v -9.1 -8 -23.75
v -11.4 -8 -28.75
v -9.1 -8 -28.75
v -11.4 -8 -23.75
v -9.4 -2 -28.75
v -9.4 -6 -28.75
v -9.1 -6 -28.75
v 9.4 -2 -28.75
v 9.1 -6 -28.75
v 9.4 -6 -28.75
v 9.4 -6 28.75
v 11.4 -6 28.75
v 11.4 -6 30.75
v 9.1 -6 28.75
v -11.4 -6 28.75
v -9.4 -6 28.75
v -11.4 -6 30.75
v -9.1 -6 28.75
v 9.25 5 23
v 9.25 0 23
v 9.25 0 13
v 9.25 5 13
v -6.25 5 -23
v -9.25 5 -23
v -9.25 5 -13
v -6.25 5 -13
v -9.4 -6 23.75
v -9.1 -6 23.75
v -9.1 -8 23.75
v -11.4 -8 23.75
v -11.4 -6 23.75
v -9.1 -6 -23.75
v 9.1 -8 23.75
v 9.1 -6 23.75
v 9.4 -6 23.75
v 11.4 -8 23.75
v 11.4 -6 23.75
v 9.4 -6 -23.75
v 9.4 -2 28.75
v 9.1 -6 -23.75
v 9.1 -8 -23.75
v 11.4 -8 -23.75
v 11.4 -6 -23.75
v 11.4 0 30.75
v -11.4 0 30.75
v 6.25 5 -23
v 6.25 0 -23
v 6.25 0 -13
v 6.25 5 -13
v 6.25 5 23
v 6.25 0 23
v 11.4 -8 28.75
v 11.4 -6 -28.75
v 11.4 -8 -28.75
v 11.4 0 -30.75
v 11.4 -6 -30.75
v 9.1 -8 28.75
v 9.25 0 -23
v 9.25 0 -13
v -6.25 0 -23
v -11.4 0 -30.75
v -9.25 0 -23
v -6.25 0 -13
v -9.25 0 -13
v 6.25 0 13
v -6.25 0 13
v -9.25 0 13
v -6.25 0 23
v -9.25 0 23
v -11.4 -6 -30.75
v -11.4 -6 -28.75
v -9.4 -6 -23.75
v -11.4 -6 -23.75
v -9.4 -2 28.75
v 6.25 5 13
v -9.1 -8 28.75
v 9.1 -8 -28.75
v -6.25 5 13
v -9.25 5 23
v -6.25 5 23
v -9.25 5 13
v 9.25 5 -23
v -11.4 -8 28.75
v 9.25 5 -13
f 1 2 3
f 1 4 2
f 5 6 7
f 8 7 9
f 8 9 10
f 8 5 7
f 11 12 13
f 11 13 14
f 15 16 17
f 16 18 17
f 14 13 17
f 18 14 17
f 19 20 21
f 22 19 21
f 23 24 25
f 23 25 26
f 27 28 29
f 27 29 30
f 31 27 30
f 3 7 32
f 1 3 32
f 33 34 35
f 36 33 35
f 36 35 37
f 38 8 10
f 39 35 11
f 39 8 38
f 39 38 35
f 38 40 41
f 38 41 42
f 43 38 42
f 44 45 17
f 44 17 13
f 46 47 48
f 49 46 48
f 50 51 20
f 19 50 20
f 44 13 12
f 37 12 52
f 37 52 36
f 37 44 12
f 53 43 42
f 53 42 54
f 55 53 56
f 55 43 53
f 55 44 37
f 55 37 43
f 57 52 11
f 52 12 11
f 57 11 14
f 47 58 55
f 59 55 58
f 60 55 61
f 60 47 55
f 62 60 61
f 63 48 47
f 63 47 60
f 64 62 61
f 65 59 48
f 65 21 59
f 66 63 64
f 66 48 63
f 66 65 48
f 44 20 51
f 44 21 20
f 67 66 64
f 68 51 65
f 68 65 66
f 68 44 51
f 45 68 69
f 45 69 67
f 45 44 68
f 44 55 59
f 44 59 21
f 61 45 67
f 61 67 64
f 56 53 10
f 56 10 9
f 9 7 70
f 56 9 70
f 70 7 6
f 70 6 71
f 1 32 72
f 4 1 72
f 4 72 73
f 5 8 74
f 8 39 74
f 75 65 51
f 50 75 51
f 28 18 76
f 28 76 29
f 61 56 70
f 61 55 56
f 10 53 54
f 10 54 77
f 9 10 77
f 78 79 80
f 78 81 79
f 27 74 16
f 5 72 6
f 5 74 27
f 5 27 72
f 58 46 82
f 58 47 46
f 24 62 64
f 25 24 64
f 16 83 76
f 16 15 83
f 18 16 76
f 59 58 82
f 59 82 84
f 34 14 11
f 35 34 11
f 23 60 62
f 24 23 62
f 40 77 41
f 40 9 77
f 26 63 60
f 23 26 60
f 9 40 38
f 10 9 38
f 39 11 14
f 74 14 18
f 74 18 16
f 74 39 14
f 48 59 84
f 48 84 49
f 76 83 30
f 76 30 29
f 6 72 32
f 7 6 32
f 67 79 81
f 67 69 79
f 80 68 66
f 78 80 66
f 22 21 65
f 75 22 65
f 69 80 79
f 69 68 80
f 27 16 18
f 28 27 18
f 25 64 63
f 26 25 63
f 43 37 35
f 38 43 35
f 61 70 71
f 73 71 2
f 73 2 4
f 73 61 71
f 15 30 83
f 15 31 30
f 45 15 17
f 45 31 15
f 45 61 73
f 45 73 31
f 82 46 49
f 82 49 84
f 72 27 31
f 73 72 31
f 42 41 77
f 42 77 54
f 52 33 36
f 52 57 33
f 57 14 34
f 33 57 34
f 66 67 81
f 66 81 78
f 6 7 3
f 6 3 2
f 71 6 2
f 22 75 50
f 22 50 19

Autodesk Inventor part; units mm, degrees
ref_plane "YZ Plane" through (0, 0, 0) normal (1, 0, 0) x (0, 1, 0)
ref_plane "XZ Plane" through (0, 0, 0) normal (0, 1, 0) x (-1, 0, 0)
ref_plane "XY Plane" through (0, 0, 0) normal (0, 0, 1) x (1, 0, 0)
sketch "스케치1" plane through (0, 0, 0) normal (0, 1, 0) x (-1, 0, 0)
  line L0 (-9.4, 28.75) -> (9.4, 28.75)
  line L1 (9.4, 28.75) -> (9.4, -28.75)
  line L2 (9.4, -28.75) -> (-9.4, -28.75)
  line L3 (-9.4, -28.75) -> (-9.4, 28.75)
  line L4 (-9.4, 28.75) -> (9.4, -28.75) construction
  line L5 (9.4, 28.75) -> (-9.4, -28.75) construction
  line L6 (-11.4, -30.75) -> (11.4, -30.75)
  line L7 (11.4, -30.75) -> (11.4, 30.75)
  line L8 (11.4, 30.75) -> (-11.4, 30.75)
  line L9 (-11.4, 30.75) -> (-11.4, -30.75)
  point P0 (0, 0)
  dimension "d0" = 18.8
  dimension "d1" = 57.5
  dimension "d2" = 2
extrude "돌출1" add sketch "스케치1" against normal blind 2 contours L0 L1 L2 L3
extrude "돌출2" add sketch "스케치1" against normal blind 6
sketch "스케치2" plane through (0, -6, 0) normal (0, -1, 0) x (1, 0, 0)
  line L0 (11.4, -30.75) -> (11.4, 30.75) projected
  line L1 (9.4, 28.75) -> (9.4, -28.75) projected
  line L2 (9.4, -28.75) -> (-9.4, -28.75) projected
  line L3 (11.4, -28.75) -> (9.1, -28.75)
  line L4 (9.1, -28.75) -> (9.1, -23.75)
  line L5 (9.1, -23.75) -> (11.4, -23.75)
  line L6 (11.4, -23.75) -> (11.4, -28.75)
  line L7 (0, 0) -> (0, -17.1125) construction
  line L8 (0, 0) -> (-6.0193, 0) construction
  line L9 (-11.4, -28.75) -> (-9.1, -28.75)
  line L10 (-9.1, -28.75) -> (-9.1, -23.75)
  line L11 (-9.1, -23.75) -> (-11.4, -23.75)
  line L12 (11.4, 28.75) -> (9.1, 28.75)
  line L13 (9.1, 28.75) -> (9.1, 23.75)
  line L14 (9.1, 23.75) -> (11.4, 23.75)
  line L15 (-9.1, 28.75) -> (-9.1, 23.75)
  line L16 (-11.4, 28.75) -> (-9.1, 28.75)
  line L17 (-9.1, 23.75) -> (-11.4, 23.75)
  line L18 (-11.4, 30.75) -> (-11.4, -30.75) projected
  line L19 (-11.4, -28.75) -> (-11.4, -23.75)
  line L20 (-11.4, 23.75) -> (-11.4, 28.75)
  line L21 (11.4, 23.75) -> (11.4, 28.75)
  point P0 (-9.1, -28.75)
  dimension "d7" = 0.3
  dimension "d8" = 5
extrude "돌출3" add sketch "스케치2" along normal blind 2 contours L3 L1 L5 L0 | L18 L16 L15 L17 | L2 L9 L18 L11 L10 | L2 L4 L5 L1 | L14 L1 L12 L0 | L14 L13 L12 L1
sketch "스케치3" plane through (0, 0, 0) normal (0, 1, 0) x (1, 0, 0)
  line L0 (6.25, -23) -> (-6.25, -23)
  line L1 (-6.25, -23) -> (-6.25, 23)
  line L2 (-6.25, 23) -> (6.25, 23)
  line L3 (6.25, 23) -> (6.25, -23)
  line L4 (6.25, -23) -> (-6.25, 23) construction
  line L5 (-6.25, -23) -> (6.25, 23) construction
  line L6 (0, -23) -> (0, 23) construction
  line L7 (9.4, -23.75) -> (9.4, 23.75) construction
  line L8 (9.4, 0) -> (-6.25, 0) construction
  line L9 (-6.25, -23) -> (-9.25, -23)
  line L10 (-9.25, -23) -> (-9.25, -13)
  line L11 (-9.25, -13) -> (-6.25, -13)
  line L12 (-6.25, -13) -> (-6.25, -23)
  line L13 (6.25, -23) -> (9.25, -23)
  line L14 (9.25, -23) -> (9.25, -13)
  line L15 (9.25, -13) -> (6.25, -13)
  line L16 (6.25, -13) -> (6.25, -23)
  line L17 (-6.25, 23) -> (-9.25, 23)
  line L18 (-9.25, 23) -> (-9.25, 13)
  line L19 (-9.25, 13) -> (-6.25, 13)
  line L20 (-6.25, 13) -> (-6.25, 23)
  line L21 (9.25, 13) -> (6.25, 13)
  line L22 (6.25, 13) -> (6.25, 23)
  line L23 (9.25, 23) -> (9.25, 13)
  line L24 (6.25, 23) -> (9.25, 23)
  point P0 (0, 0)
  dimension "d12" = 46
  dimension "d13" = 3
  dimension "d14" = 10
  dimension "d15" = 9.25
extrude "돌출4" add sketch "스케치3" along normal blind 5 contours L3 L15 L14 L13 | L9 L10 L11 L1 | L3 L24 L23 L21 | L19 L18 L17 L1
properties part number "converter2" material "고무, 검은색"
